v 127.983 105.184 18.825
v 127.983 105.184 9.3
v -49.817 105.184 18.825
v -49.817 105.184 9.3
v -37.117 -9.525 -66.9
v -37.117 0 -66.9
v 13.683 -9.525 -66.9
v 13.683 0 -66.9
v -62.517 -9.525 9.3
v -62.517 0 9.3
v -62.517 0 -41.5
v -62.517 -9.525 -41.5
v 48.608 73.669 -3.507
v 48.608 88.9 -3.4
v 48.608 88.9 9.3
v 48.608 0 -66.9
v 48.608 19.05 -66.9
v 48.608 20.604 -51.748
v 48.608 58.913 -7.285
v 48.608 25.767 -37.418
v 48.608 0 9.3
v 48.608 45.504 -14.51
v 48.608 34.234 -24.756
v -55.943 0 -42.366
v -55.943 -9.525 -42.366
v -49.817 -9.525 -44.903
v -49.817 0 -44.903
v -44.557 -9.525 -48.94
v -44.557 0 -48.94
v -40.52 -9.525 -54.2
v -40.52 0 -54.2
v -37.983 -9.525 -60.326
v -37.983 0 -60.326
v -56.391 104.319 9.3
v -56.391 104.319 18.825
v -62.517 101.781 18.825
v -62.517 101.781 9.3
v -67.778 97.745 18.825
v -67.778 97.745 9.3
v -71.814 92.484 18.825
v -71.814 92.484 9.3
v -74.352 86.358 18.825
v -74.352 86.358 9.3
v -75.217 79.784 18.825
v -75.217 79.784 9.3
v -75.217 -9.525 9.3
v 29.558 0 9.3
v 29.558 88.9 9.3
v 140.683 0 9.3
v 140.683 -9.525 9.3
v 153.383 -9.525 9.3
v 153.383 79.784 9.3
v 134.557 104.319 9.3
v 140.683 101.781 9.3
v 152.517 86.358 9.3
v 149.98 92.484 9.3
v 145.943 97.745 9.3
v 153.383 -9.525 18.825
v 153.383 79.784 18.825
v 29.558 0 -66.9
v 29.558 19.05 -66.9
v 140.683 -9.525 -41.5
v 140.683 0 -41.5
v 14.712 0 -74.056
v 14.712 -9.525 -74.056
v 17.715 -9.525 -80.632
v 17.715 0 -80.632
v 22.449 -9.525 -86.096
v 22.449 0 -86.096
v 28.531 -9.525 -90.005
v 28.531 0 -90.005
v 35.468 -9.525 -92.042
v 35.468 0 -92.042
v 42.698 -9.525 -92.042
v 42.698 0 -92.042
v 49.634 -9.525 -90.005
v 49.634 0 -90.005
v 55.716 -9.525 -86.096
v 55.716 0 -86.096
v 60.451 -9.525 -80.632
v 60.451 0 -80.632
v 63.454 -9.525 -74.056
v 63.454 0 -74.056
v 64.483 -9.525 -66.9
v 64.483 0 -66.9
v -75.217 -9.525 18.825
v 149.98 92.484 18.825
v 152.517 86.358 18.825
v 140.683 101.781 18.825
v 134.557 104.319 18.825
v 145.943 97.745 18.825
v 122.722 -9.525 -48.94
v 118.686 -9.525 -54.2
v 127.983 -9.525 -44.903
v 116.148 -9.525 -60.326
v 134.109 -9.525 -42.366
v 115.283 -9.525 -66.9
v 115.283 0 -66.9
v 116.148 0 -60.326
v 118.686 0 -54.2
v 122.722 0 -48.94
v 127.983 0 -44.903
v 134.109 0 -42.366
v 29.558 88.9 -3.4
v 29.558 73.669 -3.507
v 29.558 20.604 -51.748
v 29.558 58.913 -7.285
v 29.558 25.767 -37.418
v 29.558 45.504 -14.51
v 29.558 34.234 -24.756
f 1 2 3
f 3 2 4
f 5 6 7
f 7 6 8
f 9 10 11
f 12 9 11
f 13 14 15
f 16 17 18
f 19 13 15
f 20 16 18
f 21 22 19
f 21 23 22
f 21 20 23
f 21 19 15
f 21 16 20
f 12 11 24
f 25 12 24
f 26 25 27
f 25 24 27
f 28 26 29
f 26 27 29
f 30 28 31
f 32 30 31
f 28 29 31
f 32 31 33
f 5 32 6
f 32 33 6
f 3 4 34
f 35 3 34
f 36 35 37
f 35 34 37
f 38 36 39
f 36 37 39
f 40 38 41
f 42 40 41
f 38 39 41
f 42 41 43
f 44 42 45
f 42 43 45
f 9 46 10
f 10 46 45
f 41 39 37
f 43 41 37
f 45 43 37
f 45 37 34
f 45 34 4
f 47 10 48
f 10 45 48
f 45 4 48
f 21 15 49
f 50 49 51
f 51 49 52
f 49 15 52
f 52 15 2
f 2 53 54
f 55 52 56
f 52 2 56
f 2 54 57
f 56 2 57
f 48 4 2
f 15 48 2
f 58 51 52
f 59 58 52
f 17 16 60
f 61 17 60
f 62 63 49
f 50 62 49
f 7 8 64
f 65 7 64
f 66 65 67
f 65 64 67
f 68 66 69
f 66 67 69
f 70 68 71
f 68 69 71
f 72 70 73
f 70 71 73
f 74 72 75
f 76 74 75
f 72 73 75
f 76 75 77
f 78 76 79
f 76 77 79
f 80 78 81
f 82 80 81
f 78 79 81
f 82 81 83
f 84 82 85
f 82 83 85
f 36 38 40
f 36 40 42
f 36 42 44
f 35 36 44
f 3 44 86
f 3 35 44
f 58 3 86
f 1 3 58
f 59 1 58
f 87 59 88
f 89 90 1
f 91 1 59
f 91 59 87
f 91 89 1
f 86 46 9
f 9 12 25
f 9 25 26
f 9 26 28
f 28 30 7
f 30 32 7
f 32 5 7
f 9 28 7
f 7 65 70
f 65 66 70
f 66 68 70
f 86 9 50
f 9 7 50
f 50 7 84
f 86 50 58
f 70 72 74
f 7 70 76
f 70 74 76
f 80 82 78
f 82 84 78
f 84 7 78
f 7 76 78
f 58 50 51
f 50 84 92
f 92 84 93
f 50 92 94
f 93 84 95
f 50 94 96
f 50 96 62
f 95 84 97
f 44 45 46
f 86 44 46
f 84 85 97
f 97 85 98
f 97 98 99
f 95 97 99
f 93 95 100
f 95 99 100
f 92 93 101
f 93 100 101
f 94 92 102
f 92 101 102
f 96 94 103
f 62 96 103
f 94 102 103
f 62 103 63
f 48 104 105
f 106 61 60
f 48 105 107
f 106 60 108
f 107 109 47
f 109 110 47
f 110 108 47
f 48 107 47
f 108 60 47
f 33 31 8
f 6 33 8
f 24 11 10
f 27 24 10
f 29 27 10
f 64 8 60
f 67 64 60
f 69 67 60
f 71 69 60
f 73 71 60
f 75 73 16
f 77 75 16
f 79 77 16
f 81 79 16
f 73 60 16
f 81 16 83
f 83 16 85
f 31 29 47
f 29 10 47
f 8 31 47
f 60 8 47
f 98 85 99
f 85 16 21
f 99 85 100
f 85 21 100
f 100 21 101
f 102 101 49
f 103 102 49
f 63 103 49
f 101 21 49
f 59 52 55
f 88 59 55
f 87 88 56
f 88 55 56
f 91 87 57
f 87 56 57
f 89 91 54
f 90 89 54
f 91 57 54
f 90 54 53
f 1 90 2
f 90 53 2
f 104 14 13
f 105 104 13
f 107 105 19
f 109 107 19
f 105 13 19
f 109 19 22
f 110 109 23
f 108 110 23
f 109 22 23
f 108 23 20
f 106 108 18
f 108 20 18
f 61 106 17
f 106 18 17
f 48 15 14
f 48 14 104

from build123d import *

# Parameters (mm, degrees)
F1_DEPTH = 9.525
F2_W     = 203.2
F2_H     = 9.525
F3_DEPTH = 9.525
F4_W     = 19.05
F4_H     = 76.2
F5_DEPTH = 88.9
F7_DEPTH = 123.826


with BuildPart() as f1:
    # F0 (on Front) → F1 (new body)
    with BuildSketch(Plane.XZ):
        with BuildLine():
            Line((140.682878, 9.299915), (-62.517122, 9.299915))
            Line((-62.517122, 9.299915), (-62.517122, -41.500085))
            ThreePointArc((-62.517122, -41.500085), (-44.55661, -48.939573), (-37.117122, -66.900085))
            Line((-37.117122, -66.900085), (13.682878, -66.900085))
            ThreePointArc((13.682878, -66.900085), (39.082878, -92.300085), (64.482878, -66.900085))
            Line((64.482878, -66.900085), (115.282878, -66.900085))
            ThreePointArc((115.282878, -66.900085), (122.722366, -48.939573), (140.682878, -41.500085))
            Line((140.682878, -41.500085), (140.682878, 9.299915))
        make_face()
    extrude(amount=F1_DEPTH)

    # F2 (on face) → F3 (join)
    with BuildSketch(Plane.XY.offset(9.299915)):
        with Locations((39.082878, -4.7625)):
            Rectangle(F2_W, F2_H)
        with BuildLine():
            Line((-75.217122, -9.525), (-62.517122, -9.525))
            Line((-62.517122, -9.525), (-62.517122, 0))
            Line((-62.517122, 0), (140.682878, 0))
            Line((140.682878, 0), (140.682878, -9.525))
            Line((140.682878, -9.525), (153.382878, -9.525))
            Line((153.382878, -9.525), (153.382878, 79.784349))
            ThreePointArc((153.382878, 79.784349), (145.94339, 97.744861), (127.982878, 105.184349))
            Line((127.982878, 105.184349), (-49.817122, 105.184349))
            ThreePointArc((-49.817122, 105.184349), (-67.777634, 97.744861), (-75.217122, 79.784349))
            Line((-75.217122, 79.784349), (-75.217122, -9.525))
        make_face()
    extrude(amount=F3_DEPTH)

    # F4 (on face) → F5 (join)
    with BuildSketch(Plane(origin=(0, 0, 0), x_dir=(-1, 0, 0), z_dir=(0, 1, 0))):
        with Locations((-39.082878, -28.800085)):
            Rectangle(F4_W, F4_H)
    extrude(amount=F5_DEPTH)

    # F6 (on face) → F7 (cut, through all)
    with BuildSketch(Plane.YZ.offset(48.607878)):
        with BuildLine():
            ThreePointArc((19.05, -66.900085), (82.336633, -128.35491), (144.408027, -65.672893))
            ThreePointArc((144.408027, -65.672893), (128.516712, -23.962451), (88.9, -3.400085))
            ThreePointArc((88.9, -3.400085), (39.556499, -19.289734), (19.05, -66.900085))
        make_face()
    extrude(amount=-F7_DEPTH, mode=Mode.SUBTRACT)


solid = f1.part
